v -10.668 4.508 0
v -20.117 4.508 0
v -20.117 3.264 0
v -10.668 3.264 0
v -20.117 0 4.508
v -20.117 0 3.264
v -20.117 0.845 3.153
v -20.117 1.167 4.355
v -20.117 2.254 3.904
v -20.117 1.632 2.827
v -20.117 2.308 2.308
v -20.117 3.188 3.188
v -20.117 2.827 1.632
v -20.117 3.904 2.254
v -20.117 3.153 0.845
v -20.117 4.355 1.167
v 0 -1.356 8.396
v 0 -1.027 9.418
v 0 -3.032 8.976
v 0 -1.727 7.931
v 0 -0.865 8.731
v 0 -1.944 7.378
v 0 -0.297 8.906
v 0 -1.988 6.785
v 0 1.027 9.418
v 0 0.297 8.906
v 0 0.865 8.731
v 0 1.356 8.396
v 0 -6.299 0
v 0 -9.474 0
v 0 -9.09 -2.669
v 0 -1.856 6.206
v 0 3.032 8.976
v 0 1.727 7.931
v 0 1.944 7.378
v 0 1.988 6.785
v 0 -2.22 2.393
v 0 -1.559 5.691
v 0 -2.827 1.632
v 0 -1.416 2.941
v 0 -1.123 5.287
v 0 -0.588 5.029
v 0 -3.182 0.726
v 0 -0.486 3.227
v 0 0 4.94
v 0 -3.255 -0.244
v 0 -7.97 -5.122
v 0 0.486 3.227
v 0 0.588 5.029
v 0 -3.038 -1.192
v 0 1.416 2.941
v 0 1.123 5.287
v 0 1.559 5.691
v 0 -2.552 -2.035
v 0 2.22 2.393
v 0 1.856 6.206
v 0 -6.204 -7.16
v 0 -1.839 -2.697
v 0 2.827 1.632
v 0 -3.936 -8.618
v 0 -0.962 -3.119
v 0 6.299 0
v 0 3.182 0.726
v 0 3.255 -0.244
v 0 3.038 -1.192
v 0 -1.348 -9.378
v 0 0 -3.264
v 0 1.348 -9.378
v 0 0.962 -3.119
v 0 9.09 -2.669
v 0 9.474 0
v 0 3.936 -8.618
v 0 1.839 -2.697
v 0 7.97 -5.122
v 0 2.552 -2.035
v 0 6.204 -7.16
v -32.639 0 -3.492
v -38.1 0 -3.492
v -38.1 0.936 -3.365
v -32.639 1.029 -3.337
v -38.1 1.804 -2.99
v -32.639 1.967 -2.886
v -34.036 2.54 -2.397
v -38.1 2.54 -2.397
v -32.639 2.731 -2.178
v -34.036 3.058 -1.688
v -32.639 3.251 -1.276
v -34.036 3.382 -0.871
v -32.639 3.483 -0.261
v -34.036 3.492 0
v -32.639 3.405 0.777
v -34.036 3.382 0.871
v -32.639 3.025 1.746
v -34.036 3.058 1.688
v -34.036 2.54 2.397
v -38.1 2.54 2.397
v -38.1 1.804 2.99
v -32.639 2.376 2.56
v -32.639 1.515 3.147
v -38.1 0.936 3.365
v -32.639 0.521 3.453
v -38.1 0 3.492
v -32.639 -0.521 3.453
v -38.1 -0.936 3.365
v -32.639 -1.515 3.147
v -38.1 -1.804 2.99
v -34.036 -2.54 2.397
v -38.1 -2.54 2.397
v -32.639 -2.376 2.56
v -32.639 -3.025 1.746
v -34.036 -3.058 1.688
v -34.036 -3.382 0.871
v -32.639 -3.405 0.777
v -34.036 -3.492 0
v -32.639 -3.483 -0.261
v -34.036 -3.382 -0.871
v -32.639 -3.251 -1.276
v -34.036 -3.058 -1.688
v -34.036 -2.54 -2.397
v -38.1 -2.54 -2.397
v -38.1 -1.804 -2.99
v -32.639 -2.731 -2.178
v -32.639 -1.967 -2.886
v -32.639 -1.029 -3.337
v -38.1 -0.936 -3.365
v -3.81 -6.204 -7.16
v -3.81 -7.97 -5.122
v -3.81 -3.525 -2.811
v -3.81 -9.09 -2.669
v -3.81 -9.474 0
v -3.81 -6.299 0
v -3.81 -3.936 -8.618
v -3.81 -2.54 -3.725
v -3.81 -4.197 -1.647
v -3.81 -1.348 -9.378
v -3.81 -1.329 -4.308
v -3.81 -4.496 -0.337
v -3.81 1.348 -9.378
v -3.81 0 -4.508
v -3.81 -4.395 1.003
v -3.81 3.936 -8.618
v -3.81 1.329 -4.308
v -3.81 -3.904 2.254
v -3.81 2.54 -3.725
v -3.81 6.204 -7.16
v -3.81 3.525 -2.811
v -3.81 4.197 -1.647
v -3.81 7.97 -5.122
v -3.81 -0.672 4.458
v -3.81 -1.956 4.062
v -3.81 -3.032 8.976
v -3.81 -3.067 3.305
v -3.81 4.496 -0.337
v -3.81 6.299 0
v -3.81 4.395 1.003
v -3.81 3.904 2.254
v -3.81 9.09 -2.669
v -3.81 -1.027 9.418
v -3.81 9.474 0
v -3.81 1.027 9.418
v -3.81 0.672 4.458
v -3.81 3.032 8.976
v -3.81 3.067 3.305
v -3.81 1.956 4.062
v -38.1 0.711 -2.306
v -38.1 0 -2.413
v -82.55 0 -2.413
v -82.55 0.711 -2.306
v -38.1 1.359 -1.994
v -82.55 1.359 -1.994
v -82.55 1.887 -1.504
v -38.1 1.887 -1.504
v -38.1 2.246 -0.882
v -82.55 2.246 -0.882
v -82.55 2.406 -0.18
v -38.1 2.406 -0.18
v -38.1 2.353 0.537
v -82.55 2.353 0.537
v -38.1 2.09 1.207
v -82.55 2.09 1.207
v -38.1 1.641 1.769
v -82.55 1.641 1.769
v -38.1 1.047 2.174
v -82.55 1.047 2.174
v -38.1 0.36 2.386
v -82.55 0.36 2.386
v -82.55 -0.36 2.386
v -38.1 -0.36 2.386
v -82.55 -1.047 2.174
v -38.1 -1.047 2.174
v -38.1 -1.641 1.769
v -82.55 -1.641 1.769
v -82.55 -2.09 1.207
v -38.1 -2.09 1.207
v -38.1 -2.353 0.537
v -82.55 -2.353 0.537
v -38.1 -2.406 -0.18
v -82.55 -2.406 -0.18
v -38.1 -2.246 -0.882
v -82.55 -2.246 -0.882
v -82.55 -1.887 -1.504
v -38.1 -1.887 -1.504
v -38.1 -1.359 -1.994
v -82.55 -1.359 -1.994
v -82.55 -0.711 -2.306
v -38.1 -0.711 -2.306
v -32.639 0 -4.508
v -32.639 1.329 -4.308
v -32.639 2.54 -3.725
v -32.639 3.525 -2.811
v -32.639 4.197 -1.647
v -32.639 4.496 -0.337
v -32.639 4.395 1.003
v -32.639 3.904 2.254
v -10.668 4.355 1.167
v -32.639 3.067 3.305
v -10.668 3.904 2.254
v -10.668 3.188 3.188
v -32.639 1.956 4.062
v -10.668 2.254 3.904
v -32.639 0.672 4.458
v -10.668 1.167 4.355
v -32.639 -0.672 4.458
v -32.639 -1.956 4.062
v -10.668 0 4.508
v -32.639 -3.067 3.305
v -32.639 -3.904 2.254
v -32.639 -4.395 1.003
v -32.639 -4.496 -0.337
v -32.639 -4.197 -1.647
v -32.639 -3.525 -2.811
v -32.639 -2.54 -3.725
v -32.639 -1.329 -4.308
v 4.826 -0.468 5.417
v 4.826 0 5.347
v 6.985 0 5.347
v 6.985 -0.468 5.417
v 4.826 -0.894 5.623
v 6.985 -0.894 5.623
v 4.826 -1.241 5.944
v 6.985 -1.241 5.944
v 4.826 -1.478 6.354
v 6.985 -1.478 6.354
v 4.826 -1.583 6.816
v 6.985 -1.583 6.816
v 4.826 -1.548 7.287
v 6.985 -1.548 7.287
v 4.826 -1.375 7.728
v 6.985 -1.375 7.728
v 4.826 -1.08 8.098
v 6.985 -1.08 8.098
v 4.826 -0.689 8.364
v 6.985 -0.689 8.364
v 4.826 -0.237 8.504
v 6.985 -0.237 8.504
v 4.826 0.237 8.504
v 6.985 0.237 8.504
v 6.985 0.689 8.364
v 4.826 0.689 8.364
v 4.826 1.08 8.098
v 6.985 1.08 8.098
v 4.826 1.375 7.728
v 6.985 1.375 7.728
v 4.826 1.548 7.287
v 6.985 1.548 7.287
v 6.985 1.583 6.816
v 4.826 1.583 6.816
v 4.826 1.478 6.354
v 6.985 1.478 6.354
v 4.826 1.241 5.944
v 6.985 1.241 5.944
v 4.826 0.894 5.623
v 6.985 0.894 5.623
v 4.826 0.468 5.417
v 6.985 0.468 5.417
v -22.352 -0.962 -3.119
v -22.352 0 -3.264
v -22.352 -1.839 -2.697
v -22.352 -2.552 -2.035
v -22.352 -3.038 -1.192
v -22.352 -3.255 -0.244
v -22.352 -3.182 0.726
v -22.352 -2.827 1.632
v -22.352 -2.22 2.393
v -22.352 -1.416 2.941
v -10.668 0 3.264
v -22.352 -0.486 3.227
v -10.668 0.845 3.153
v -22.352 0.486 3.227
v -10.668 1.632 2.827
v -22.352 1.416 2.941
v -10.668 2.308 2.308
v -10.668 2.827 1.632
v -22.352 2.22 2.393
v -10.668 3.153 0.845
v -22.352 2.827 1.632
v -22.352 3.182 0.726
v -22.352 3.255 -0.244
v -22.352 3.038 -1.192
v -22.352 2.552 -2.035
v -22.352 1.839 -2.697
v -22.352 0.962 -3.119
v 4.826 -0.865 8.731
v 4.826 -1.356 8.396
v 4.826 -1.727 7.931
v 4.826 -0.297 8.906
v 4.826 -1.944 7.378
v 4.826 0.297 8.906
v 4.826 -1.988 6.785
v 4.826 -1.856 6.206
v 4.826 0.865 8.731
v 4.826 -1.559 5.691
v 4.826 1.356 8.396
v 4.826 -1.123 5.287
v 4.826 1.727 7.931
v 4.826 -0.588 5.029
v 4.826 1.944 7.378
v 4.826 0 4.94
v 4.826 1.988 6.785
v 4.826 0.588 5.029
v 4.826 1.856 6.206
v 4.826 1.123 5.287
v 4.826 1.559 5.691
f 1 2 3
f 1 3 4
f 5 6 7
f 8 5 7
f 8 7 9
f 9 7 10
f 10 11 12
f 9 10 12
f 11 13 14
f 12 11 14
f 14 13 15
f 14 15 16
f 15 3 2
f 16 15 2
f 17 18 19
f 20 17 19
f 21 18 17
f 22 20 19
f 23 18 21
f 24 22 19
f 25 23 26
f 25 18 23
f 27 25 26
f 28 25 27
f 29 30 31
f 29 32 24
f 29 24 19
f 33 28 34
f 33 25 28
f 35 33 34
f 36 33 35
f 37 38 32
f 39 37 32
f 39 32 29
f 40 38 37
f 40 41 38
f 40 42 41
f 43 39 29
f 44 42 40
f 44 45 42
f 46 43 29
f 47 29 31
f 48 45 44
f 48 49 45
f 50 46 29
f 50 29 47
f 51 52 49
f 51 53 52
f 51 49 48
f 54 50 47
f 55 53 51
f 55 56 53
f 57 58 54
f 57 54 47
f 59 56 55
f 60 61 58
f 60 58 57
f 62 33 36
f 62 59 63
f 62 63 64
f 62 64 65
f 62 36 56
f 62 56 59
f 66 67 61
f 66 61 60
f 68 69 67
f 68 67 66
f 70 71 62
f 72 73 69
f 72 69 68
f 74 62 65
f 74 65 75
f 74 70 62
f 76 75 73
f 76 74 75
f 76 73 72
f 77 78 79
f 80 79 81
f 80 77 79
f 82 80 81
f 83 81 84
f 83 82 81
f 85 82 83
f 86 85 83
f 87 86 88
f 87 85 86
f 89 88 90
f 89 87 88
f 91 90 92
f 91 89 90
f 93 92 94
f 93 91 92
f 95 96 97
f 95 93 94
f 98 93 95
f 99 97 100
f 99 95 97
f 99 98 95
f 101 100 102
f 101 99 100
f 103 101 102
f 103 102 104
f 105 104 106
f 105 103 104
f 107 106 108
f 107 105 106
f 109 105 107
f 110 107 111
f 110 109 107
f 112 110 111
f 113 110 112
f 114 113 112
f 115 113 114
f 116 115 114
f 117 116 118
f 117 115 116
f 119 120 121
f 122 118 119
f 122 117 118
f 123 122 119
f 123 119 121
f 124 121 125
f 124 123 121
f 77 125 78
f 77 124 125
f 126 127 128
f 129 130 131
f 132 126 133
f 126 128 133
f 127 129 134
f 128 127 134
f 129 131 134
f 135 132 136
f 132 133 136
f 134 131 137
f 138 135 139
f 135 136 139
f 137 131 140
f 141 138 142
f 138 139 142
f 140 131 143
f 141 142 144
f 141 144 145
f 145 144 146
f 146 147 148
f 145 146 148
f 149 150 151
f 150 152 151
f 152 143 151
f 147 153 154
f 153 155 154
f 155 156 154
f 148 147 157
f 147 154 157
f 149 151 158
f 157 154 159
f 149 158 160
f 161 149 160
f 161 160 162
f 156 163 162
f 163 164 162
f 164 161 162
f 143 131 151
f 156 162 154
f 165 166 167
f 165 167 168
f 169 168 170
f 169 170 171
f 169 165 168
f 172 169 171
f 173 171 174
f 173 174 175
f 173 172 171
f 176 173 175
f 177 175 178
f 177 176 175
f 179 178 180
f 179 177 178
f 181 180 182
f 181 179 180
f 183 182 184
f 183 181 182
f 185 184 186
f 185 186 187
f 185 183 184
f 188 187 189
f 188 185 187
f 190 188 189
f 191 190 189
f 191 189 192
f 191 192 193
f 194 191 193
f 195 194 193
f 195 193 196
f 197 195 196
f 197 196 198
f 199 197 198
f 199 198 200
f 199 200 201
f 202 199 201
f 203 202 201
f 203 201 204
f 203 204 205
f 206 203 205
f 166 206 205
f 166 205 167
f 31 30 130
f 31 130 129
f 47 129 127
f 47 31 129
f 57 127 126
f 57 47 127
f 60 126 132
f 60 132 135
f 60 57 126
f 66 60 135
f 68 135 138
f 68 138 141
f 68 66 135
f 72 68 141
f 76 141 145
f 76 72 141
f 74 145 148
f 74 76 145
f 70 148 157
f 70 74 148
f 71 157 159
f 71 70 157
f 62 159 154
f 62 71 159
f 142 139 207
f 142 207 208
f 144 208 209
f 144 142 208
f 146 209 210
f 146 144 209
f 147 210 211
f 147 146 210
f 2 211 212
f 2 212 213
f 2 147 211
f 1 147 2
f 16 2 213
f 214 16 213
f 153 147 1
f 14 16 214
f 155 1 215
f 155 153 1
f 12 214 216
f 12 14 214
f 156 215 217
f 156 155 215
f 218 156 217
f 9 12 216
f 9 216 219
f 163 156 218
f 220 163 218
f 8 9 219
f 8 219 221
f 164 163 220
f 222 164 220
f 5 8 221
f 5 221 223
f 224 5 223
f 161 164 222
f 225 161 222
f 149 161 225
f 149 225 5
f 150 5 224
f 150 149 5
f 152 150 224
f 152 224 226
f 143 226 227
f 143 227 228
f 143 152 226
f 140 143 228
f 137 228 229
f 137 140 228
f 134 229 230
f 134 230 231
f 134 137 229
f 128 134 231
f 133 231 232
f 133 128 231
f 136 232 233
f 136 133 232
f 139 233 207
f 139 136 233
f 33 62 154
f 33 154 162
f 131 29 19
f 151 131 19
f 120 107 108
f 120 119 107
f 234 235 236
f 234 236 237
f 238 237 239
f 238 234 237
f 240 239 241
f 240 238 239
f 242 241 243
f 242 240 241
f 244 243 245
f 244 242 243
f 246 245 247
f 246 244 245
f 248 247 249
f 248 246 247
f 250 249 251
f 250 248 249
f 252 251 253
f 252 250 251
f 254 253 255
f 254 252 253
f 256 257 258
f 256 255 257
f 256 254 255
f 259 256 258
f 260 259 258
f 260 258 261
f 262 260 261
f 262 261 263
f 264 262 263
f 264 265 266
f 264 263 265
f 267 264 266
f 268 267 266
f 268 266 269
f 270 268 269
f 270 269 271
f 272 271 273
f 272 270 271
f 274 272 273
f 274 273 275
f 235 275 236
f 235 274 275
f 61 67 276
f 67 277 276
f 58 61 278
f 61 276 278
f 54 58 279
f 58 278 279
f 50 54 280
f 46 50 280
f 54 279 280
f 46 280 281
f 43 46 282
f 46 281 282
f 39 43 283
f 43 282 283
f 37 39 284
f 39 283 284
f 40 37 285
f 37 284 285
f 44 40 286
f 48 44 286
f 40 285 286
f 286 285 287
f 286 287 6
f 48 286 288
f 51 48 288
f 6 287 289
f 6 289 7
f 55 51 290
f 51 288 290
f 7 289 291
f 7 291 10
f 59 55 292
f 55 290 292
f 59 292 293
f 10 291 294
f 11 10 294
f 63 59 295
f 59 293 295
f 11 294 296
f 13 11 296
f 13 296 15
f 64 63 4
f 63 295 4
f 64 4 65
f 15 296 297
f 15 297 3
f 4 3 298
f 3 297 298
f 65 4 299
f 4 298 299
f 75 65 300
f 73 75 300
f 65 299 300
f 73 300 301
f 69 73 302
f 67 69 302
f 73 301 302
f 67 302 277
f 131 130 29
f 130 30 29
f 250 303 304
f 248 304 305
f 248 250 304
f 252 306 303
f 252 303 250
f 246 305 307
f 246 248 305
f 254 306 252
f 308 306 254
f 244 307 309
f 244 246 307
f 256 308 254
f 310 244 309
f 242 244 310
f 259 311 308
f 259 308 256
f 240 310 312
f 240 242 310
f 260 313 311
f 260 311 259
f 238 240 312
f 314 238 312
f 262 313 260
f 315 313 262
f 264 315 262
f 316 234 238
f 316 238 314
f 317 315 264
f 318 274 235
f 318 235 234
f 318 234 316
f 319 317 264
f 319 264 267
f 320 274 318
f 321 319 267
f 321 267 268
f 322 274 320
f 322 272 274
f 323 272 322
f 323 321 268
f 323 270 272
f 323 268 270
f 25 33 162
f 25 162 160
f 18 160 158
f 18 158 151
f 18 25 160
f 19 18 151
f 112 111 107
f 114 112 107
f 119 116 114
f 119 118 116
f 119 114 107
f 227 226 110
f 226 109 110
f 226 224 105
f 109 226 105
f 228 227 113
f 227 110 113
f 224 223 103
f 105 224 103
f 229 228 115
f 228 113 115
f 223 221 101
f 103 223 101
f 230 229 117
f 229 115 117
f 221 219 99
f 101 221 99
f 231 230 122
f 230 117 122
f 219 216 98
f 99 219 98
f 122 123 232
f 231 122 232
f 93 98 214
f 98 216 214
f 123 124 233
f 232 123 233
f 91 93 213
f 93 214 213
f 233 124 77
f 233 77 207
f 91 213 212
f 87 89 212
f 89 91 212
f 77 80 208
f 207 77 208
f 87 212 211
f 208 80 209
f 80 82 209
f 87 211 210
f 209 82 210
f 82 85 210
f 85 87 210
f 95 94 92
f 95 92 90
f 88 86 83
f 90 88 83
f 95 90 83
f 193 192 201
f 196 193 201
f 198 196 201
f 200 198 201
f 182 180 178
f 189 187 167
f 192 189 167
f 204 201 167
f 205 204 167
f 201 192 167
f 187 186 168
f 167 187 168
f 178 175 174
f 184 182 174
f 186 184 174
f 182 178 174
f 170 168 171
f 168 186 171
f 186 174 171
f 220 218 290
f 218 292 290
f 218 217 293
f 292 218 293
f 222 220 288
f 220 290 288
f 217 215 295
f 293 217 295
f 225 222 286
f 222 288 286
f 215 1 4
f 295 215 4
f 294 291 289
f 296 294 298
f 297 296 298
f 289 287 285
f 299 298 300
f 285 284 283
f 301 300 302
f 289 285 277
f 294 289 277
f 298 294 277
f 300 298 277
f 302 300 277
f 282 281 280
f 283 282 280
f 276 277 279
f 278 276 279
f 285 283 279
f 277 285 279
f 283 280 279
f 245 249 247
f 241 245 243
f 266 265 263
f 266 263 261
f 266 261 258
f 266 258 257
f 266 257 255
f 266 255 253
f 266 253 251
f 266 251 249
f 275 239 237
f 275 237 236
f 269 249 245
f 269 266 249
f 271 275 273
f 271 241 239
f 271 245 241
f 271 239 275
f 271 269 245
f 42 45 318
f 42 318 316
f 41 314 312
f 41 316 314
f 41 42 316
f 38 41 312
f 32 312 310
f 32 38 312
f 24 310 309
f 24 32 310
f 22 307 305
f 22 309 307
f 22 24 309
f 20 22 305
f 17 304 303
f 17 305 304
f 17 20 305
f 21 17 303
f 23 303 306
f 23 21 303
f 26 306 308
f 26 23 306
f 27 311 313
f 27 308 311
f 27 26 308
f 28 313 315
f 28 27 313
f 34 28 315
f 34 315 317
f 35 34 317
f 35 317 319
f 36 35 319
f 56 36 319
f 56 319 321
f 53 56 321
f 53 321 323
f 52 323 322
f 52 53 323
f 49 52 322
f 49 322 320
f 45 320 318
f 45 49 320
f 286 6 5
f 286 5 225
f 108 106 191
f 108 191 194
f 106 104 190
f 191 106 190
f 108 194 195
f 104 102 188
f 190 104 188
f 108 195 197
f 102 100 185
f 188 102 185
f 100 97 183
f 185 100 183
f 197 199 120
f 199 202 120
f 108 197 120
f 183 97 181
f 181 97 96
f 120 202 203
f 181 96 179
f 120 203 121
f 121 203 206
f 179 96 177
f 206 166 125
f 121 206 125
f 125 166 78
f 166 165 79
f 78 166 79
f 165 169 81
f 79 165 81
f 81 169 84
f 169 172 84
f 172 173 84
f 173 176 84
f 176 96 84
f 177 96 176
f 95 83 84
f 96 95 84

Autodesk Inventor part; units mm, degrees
ref_plane "YZ Plane" through (0, 0, 0) normal (1, 0, 0) x (0, 1, 0)
ref_plane "XZ Plane" through (0, 0, 0) normal (0, 1, 0) x (-1, 0, 0)
ref_plane "XY Plane" through (0, 0, 0) normal (0, 0, 1) x (1, 0, 0)
sketch "Sketch1" plane through (0, 0, 0) normal (1, 0, 0) x (0, 1, 0)
  circle A0 centre (0, 0) radius 9.4742
  dimension "d0" = 9.4742
extrude "Extrusion1" add sketch "Sketch1" against normal blind 3.81
sketch "Sketch2" plane through (0, 0, 0) normal (1, 0, 0) x (0, 0, -1)
  circle A0 centre (0, 0) radius 9.4742 projected
  circle A1 centre (0, 0) radius 4.5085
  dimension "d4" = 9.017
extrude "Extrusion2" add sketch "Sketch2" against normal blind 32.639 contours A1
sketch "Sketch3" plane through (0, 0, 0) normal (1, 0, 0) x (0, 0, -1)
  circle A0 centre (0, 0) radius 9.4742 projected
  circle A1 centre (0, 0) radius 3.4925
  dimension "d9" = 6.985
extrude "Extrusion3" add sketch "Sketch3" against normal blind 38.1 contours A1
sketch "Sketch4" plane through (0, 0, 0) normal (1, 0, 0) x (0, 0, -1)
  circle A0 centre (0, 0) radius 9.4742 projected
  circle A1 centre (0, 0) radius 2.413
  dimension "d13" = 4.826
extrude "Extrusion4" add sketch "Sketch4" against normal blind 82.55 contours A1
sketch "Sketch5" plane through (0, 0, 0) normal (0, 0, 1) x (1, 0, 0)
  line L0 (-3.81, 9.4742) -> (0, 9.4742) projected
  line L1 (0, 9.4742) -> (0, -9.4742) projected
  line L2 (0, -9.4742) -> (-3.81, -9.4742) projected
  line L3 (-3.81, -9.4742) -> (-3.81, -4.5085) projected
  line L4 (-3.81, -4.5085) -> (-32.639, -4.5085) projected
  line L5 (-32.639, -4.5085) -> (-32.639, -3.4925) projected
  line L6 (-32.639, -3.4925) -> (-38.1, -3.4925) projected
  line L7 (-38.1, -3.4925) -> (-38.1, -2.413) projected
  line L8 (-38.1, -2.413) -> (-82.55, -2.413) projected
  line L9 (-82.55, -2.413) -> (-82.55, 2.413) projected
  line L10 (-82.55, 2.413) -> (-38.1, 2.413) projected
  line L11 (-38.1, 2.413) -> (-38.1, 3.4925) projected
  line L12 (-38.1, 3.4925) -> (-32.639, 3.4925) projected
  line L13 (-32.639, 3.4925) -> (-32.639, 4.5085) projected
  line L14 (-32.639, 4.5085) -> (-3.81, 4.5085) projected
  line L15 (-3.81, 4.5085) -> (-3.81, 9.4742) projected
  line L16 (-38.1, 3.4925) -> (-34.036, 3.4925)
  line L17 (-34.036, 3.4925) -> (-34.036, 2.54)
  line L18 (-34.036, 2.54) -> (-38.1, 2.54)
  line L19 (-38.1, 2.54) -> (-38.1, 3.4925)
  line L20 (-38.1, -3.4925) -> (-34.036, -3.4925)
  line L21 (-34.036, -3.4925) -> (-34.036, -2.54)
  line L22 (-34.036, -2.54) -> (-38.1, -2.54)
  line L23 (-38.1, -2.54) -> (-38.1, -3.4925)
  point P0 (0, 0)
  dimension "d17" = 34.036
  dimension "d18" = 5.08
extrude "Extrusion5" cut sketch "Sketch5" along normal through all both and the other way through all contours L17 L18 L11 L12 | L6 L7 L22 L21
thread "Thread1" size "10-24 UNC" class "2A" standard "ANSI Unified Screw Threads" length 13.97
sketch "Sketch6" plane through (0, 0, 0) normal (1, 0, 0) x (0, 0, -1)
  circle A0 centre (0, 0) radius 9.4742 projected
hole "Hole1" at (0, 0, 0) direction (-1, 0, 0) diameter 6.5278 depth 22.352
sketch "Sketch7" plane through (0, 0, 0) normal (0, 0, 1) x (1, 0, 0)
  line L0 (-3.81, 9.4742) -> (0, 9.4742) projected
  line L1 (0, 9.4742) -> (0, 3.2639) projected
  line L2 (0, 3.2639) -> (-22.352, 3.2639) projected
  line L3 (-22.352, 3.2639) -> (-22.352, -3.2639) projected
  line L4 (-22.352, -3.2639) -> (0, -3.2639) projected
  line L5 (0, -3.2639) -> (0, -9.4742) projected
  line L6 (0, -9.4742) -> (-3.81, -9.4742) projected
  line L7 (-3.81, -9.4742) -> (-3.81, -4.5085) projected
  line L8 (-3.81, -4.5085) -> (-32.639, -4.5085) projected
  line L9 (-32.639, -4.5085) -> (-32.639, -3.4925) projected
  line L10 (-32.639, -3.4925) -> (-34.036, -3.4925) projected
  line L11 (-34.036, -3.4925) -> (-34.036, -2.54) projected
  line L12 (-34.036, -2.54) -> (-38.1, -2.54) projected
  line L13 (-38.1, -2.54) -> (-38.1, -2.413) projected
  line L14 (-38.1, -2.413) -> (-82.55, -2.413) projected
  line L15 (-82.55, -2.413) -> (-82.55, 2.413) projected
  line L16 (-82.55, 2.413) -> (-38.1, 2.413) projected
  line L17 (-38.1, 2.413) -> (-38.1, 2.54) projected
  line L18 (-38.1, 2.54) -> (-34.036, 2.54) projected
  line L19 (-34.036, 2.54) -> (-34.036, 3.4925) projected
  line L20 (-34.036, 3.4925) -> (-32.639, 3.4925) projected
  line L21 (-32.639, 3.4925) -> (-32.639, 4.5085) projected
  line L22 (-32.639, 4.5085) -> (-3.81, 4.5085) projected
  line L23 (-3.81, 4.5085) -> (-3.81, 9.4742) projected
  line L24 (-65.532, 0) -> (10.922, 0) projected
  line L25 (-10.668, 0) -> (-20.1168, 0)
  line L26 (-20.1168, 0) -> (-20.1168, 4.5085)
  line L27 (-20.1168, 4.5085) -> (-10.668, 4.5085)
  line L28 (-10.668, 4.5085) -> (-10.668, 0)
  point P0 (0, 0)
  dimension "d30" = 10.668
  dimension "d31" = 20.1168
extrude "Extrusion6" cut sketch "Sketch7" along normal through all contours L28 L2 L26 L22 | L28 L24 L26 L2
sketch "Sketch8" plane through (0, 0, 0) normal (1, 0, 0) x (0, 0, -1)
  circle A0 centre (0, 0) radius 3.2639 projected
  circle A1 centre (0, 0) radius 9.4742 projected
  line L0 (0, -9.4742) -> (0, -6.2992)
  line L1 (0, -6.2992) -> (-8.9758, -3.0323)
  line L2 (0, 0) -> (-9.4742, 0)
  line L3 (0, 9.4742) -> (0, 6.2992)
  line L4 (0, 6.2992) -> (-8.9758, 3.0323)
  dimension "d34" = 3.175
  dimension "d36" = 110
extrude "Extrusion7" cut sketch "Sketch8" against normal through all contours A1 L3 L4 | L1 L0 A1
sketch "Sketch9" plane through (0, 0, 0) normal (1, 0, 0) x (0, 0, -1)
  arc A0 (0, -9.4742) -> (0, 9.4742) centre (0, 0) ccw projected
  circle A1 centre (-6.9342, 0) radius 1.9939
  dimension "d43" = 6.9342
  dimension "d47" = 3.9878
extrude "Extrusion8" add sketch "Sketch9" along normal blind 4.826
sketch "Sketch10" plane through (4.826, 0, 6.9342) normal (1, 0, 0) x (0, 0, -1)
  circle A0 centre (0, 0) radius 1.9939 projected
  circle A1 centre (0, 0) radius 1.5875
  point P0 (6.9342, 0)
  dimension "d49" = 3.175
extrude "Extrusion9" add sketch "Sketch10" along normal blind 2.159 contours A1
properties part number "Crankshaft" material "Steel"
